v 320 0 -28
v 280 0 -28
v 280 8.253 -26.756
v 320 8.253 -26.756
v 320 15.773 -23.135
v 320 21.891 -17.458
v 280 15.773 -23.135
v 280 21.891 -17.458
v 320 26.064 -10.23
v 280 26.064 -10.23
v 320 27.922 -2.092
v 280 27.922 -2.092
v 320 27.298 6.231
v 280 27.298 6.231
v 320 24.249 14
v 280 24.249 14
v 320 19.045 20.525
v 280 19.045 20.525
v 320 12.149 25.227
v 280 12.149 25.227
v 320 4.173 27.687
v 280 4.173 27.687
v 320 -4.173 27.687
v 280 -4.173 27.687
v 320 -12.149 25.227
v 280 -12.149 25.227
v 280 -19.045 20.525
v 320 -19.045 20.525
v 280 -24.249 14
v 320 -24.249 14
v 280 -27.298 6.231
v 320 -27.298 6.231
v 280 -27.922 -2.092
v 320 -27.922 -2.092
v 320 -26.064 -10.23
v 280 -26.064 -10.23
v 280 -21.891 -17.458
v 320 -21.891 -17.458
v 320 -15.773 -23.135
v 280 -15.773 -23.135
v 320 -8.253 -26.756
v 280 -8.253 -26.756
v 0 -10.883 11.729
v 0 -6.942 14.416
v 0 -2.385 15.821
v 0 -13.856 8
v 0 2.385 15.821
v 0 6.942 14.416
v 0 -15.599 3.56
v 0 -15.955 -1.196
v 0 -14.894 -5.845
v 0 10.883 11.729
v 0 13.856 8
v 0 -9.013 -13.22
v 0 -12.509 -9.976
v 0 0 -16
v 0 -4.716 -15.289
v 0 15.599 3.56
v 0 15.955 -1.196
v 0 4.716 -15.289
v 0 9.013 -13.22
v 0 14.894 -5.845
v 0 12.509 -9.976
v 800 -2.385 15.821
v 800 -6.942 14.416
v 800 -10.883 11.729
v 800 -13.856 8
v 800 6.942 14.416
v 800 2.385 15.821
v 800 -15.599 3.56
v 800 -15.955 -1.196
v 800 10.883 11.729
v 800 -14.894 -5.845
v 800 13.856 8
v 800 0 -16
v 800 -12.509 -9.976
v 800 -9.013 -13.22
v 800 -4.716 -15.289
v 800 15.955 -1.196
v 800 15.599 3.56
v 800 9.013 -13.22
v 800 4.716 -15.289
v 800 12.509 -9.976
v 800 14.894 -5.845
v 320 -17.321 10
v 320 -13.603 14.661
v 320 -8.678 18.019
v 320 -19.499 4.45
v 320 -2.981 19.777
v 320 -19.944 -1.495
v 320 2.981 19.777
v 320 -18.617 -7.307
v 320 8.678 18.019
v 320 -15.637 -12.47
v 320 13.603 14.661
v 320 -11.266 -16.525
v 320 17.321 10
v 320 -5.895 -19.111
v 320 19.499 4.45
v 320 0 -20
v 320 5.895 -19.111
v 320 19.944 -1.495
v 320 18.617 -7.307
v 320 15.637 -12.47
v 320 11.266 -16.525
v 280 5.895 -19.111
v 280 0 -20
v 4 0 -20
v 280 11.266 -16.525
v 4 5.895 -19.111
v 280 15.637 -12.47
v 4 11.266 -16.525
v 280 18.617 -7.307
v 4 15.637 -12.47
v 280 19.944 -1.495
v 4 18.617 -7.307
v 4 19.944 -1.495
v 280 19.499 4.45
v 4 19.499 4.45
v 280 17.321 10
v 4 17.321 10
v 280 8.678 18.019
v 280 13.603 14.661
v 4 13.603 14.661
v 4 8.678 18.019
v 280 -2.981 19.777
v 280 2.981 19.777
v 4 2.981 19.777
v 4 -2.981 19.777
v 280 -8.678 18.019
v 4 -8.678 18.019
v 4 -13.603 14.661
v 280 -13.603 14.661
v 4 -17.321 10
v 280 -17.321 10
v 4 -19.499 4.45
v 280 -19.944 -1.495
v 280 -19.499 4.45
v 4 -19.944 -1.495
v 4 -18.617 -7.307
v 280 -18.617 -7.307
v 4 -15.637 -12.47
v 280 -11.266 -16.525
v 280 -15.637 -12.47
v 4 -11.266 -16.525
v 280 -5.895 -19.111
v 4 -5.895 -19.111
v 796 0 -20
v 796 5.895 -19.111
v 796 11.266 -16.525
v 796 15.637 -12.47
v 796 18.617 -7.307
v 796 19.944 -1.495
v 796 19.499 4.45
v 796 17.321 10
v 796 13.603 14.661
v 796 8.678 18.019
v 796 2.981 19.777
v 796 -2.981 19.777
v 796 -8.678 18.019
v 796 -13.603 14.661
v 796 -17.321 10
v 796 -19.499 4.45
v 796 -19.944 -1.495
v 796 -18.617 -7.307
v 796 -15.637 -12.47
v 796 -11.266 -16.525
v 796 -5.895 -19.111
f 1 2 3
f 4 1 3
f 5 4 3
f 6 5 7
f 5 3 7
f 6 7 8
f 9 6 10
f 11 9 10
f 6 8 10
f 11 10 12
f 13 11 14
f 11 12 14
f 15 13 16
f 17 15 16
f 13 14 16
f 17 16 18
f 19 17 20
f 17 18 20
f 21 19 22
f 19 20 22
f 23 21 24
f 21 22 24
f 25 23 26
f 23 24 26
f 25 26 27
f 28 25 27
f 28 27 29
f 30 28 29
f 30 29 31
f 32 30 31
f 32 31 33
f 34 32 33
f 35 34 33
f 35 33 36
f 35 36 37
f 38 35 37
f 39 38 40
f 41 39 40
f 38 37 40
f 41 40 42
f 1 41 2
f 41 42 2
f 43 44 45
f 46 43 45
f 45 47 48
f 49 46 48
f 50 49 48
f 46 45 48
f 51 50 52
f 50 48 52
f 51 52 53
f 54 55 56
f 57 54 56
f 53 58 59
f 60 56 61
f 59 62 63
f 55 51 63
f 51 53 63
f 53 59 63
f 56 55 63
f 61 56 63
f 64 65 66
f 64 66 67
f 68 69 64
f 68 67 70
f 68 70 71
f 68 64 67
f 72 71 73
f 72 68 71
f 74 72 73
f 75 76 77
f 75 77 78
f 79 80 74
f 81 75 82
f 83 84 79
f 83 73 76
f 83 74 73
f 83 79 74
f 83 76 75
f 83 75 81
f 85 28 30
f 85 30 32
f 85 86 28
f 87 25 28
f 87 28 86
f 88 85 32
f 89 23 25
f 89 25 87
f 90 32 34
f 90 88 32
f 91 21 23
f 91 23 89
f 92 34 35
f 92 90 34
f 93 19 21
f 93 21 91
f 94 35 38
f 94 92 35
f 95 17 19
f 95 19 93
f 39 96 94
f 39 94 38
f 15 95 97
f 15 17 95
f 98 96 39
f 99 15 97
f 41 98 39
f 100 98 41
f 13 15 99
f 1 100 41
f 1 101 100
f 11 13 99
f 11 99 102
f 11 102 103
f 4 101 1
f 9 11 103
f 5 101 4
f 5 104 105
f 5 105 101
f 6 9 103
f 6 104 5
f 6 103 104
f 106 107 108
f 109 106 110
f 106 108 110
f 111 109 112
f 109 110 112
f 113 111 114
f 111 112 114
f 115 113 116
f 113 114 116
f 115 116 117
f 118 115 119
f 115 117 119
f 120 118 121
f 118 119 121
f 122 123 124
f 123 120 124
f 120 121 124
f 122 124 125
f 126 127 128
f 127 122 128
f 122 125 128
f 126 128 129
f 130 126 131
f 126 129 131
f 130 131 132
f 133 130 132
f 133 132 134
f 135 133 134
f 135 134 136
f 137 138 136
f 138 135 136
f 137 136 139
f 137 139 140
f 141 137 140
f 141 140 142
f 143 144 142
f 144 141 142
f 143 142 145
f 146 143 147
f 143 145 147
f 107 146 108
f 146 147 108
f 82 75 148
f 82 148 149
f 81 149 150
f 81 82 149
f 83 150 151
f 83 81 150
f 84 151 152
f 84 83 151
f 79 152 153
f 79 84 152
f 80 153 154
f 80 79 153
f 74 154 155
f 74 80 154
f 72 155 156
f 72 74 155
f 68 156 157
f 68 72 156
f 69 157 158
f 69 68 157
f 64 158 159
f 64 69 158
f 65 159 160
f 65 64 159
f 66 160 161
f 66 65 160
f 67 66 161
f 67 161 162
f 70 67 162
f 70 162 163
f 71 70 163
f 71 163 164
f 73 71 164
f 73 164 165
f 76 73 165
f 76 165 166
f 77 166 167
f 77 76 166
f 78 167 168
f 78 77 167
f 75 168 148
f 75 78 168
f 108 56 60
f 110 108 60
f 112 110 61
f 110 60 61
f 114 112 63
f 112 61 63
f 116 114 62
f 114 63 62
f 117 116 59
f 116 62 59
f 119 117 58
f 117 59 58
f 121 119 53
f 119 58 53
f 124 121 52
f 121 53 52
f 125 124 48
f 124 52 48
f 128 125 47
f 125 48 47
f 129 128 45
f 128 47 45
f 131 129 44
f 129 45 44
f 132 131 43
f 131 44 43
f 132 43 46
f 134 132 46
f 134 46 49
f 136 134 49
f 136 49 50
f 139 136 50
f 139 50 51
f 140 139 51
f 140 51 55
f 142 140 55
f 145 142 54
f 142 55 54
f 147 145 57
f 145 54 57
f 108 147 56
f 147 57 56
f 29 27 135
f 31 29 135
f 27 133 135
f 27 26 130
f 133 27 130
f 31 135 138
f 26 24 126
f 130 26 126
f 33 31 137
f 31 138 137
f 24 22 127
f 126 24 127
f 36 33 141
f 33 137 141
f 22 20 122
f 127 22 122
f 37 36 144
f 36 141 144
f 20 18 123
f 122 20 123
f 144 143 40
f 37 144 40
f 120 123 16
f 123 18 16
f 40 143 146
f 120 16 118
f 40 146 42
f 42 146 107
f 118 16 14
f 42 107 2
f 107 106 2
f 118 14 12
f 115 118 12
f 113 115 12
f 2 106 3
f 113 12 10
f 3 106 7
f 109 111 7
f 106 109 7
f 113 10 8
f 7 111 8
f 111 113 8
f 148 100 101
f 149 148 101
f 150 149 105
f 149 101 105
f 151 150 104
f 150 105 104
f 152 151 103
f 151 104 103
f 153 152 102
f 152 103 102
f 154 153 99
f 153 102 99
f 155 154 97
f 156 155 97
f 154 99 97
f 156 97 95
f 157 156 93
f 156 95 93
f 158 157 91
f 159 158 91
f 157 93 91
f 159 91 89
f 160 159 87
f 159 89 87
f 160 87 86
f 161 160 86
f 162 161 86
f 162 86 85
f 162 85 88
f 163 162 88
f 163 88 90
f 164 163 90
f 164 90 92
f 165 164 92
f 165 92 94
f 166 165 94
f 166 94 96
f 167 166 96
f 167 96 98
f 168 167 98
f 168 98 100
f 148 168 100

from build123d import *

# Parameters (mm, degrees)
SKETCH1_R           = 20
BOSS_EXTRUDE1_DEPTH = 800
CHAMFER1_SIZE       = 4
BOSS_EXTRUDE2_START = 280
SKETCH2_R           = 28
BOSS_EXTRUDE2_DEPTH = 40


with BuildPart() as part:
    # Sketch1 → Boss-Extrude1 (new body)
    with BuildSketch(Plane(origin=(0, 0, 0), x_dir=(0, 0, -1), z_dir=(1, 0, 0))):
        Circle(SKETCH1_R)
    extrude(amount=BOSS_EXTRUDE1_DEPTH)

    # Chamfer1
    chamfer1_edges = [part.edges().sort_by_distance(p)[0] for p in [
        (0, 0, 20),
        (800, 0, 20),
    ]]
    chamfer(chamfer1_edges, length=CHAMFER1_SIZE)

    # Sketch2 → Boss-Extrude2 (add)
    with BuildSketch(Plane(origin=(0, 0, 0), x_dir=(0, 0, -1), z_dir=(1, 0, 0)).offset(BOSS_EXTRUDE2_START)):
        Circle(SKETCH2_R)
    extrude(amount=BOSS_EXTRUDE2_DEPTH)


solid = part.part
